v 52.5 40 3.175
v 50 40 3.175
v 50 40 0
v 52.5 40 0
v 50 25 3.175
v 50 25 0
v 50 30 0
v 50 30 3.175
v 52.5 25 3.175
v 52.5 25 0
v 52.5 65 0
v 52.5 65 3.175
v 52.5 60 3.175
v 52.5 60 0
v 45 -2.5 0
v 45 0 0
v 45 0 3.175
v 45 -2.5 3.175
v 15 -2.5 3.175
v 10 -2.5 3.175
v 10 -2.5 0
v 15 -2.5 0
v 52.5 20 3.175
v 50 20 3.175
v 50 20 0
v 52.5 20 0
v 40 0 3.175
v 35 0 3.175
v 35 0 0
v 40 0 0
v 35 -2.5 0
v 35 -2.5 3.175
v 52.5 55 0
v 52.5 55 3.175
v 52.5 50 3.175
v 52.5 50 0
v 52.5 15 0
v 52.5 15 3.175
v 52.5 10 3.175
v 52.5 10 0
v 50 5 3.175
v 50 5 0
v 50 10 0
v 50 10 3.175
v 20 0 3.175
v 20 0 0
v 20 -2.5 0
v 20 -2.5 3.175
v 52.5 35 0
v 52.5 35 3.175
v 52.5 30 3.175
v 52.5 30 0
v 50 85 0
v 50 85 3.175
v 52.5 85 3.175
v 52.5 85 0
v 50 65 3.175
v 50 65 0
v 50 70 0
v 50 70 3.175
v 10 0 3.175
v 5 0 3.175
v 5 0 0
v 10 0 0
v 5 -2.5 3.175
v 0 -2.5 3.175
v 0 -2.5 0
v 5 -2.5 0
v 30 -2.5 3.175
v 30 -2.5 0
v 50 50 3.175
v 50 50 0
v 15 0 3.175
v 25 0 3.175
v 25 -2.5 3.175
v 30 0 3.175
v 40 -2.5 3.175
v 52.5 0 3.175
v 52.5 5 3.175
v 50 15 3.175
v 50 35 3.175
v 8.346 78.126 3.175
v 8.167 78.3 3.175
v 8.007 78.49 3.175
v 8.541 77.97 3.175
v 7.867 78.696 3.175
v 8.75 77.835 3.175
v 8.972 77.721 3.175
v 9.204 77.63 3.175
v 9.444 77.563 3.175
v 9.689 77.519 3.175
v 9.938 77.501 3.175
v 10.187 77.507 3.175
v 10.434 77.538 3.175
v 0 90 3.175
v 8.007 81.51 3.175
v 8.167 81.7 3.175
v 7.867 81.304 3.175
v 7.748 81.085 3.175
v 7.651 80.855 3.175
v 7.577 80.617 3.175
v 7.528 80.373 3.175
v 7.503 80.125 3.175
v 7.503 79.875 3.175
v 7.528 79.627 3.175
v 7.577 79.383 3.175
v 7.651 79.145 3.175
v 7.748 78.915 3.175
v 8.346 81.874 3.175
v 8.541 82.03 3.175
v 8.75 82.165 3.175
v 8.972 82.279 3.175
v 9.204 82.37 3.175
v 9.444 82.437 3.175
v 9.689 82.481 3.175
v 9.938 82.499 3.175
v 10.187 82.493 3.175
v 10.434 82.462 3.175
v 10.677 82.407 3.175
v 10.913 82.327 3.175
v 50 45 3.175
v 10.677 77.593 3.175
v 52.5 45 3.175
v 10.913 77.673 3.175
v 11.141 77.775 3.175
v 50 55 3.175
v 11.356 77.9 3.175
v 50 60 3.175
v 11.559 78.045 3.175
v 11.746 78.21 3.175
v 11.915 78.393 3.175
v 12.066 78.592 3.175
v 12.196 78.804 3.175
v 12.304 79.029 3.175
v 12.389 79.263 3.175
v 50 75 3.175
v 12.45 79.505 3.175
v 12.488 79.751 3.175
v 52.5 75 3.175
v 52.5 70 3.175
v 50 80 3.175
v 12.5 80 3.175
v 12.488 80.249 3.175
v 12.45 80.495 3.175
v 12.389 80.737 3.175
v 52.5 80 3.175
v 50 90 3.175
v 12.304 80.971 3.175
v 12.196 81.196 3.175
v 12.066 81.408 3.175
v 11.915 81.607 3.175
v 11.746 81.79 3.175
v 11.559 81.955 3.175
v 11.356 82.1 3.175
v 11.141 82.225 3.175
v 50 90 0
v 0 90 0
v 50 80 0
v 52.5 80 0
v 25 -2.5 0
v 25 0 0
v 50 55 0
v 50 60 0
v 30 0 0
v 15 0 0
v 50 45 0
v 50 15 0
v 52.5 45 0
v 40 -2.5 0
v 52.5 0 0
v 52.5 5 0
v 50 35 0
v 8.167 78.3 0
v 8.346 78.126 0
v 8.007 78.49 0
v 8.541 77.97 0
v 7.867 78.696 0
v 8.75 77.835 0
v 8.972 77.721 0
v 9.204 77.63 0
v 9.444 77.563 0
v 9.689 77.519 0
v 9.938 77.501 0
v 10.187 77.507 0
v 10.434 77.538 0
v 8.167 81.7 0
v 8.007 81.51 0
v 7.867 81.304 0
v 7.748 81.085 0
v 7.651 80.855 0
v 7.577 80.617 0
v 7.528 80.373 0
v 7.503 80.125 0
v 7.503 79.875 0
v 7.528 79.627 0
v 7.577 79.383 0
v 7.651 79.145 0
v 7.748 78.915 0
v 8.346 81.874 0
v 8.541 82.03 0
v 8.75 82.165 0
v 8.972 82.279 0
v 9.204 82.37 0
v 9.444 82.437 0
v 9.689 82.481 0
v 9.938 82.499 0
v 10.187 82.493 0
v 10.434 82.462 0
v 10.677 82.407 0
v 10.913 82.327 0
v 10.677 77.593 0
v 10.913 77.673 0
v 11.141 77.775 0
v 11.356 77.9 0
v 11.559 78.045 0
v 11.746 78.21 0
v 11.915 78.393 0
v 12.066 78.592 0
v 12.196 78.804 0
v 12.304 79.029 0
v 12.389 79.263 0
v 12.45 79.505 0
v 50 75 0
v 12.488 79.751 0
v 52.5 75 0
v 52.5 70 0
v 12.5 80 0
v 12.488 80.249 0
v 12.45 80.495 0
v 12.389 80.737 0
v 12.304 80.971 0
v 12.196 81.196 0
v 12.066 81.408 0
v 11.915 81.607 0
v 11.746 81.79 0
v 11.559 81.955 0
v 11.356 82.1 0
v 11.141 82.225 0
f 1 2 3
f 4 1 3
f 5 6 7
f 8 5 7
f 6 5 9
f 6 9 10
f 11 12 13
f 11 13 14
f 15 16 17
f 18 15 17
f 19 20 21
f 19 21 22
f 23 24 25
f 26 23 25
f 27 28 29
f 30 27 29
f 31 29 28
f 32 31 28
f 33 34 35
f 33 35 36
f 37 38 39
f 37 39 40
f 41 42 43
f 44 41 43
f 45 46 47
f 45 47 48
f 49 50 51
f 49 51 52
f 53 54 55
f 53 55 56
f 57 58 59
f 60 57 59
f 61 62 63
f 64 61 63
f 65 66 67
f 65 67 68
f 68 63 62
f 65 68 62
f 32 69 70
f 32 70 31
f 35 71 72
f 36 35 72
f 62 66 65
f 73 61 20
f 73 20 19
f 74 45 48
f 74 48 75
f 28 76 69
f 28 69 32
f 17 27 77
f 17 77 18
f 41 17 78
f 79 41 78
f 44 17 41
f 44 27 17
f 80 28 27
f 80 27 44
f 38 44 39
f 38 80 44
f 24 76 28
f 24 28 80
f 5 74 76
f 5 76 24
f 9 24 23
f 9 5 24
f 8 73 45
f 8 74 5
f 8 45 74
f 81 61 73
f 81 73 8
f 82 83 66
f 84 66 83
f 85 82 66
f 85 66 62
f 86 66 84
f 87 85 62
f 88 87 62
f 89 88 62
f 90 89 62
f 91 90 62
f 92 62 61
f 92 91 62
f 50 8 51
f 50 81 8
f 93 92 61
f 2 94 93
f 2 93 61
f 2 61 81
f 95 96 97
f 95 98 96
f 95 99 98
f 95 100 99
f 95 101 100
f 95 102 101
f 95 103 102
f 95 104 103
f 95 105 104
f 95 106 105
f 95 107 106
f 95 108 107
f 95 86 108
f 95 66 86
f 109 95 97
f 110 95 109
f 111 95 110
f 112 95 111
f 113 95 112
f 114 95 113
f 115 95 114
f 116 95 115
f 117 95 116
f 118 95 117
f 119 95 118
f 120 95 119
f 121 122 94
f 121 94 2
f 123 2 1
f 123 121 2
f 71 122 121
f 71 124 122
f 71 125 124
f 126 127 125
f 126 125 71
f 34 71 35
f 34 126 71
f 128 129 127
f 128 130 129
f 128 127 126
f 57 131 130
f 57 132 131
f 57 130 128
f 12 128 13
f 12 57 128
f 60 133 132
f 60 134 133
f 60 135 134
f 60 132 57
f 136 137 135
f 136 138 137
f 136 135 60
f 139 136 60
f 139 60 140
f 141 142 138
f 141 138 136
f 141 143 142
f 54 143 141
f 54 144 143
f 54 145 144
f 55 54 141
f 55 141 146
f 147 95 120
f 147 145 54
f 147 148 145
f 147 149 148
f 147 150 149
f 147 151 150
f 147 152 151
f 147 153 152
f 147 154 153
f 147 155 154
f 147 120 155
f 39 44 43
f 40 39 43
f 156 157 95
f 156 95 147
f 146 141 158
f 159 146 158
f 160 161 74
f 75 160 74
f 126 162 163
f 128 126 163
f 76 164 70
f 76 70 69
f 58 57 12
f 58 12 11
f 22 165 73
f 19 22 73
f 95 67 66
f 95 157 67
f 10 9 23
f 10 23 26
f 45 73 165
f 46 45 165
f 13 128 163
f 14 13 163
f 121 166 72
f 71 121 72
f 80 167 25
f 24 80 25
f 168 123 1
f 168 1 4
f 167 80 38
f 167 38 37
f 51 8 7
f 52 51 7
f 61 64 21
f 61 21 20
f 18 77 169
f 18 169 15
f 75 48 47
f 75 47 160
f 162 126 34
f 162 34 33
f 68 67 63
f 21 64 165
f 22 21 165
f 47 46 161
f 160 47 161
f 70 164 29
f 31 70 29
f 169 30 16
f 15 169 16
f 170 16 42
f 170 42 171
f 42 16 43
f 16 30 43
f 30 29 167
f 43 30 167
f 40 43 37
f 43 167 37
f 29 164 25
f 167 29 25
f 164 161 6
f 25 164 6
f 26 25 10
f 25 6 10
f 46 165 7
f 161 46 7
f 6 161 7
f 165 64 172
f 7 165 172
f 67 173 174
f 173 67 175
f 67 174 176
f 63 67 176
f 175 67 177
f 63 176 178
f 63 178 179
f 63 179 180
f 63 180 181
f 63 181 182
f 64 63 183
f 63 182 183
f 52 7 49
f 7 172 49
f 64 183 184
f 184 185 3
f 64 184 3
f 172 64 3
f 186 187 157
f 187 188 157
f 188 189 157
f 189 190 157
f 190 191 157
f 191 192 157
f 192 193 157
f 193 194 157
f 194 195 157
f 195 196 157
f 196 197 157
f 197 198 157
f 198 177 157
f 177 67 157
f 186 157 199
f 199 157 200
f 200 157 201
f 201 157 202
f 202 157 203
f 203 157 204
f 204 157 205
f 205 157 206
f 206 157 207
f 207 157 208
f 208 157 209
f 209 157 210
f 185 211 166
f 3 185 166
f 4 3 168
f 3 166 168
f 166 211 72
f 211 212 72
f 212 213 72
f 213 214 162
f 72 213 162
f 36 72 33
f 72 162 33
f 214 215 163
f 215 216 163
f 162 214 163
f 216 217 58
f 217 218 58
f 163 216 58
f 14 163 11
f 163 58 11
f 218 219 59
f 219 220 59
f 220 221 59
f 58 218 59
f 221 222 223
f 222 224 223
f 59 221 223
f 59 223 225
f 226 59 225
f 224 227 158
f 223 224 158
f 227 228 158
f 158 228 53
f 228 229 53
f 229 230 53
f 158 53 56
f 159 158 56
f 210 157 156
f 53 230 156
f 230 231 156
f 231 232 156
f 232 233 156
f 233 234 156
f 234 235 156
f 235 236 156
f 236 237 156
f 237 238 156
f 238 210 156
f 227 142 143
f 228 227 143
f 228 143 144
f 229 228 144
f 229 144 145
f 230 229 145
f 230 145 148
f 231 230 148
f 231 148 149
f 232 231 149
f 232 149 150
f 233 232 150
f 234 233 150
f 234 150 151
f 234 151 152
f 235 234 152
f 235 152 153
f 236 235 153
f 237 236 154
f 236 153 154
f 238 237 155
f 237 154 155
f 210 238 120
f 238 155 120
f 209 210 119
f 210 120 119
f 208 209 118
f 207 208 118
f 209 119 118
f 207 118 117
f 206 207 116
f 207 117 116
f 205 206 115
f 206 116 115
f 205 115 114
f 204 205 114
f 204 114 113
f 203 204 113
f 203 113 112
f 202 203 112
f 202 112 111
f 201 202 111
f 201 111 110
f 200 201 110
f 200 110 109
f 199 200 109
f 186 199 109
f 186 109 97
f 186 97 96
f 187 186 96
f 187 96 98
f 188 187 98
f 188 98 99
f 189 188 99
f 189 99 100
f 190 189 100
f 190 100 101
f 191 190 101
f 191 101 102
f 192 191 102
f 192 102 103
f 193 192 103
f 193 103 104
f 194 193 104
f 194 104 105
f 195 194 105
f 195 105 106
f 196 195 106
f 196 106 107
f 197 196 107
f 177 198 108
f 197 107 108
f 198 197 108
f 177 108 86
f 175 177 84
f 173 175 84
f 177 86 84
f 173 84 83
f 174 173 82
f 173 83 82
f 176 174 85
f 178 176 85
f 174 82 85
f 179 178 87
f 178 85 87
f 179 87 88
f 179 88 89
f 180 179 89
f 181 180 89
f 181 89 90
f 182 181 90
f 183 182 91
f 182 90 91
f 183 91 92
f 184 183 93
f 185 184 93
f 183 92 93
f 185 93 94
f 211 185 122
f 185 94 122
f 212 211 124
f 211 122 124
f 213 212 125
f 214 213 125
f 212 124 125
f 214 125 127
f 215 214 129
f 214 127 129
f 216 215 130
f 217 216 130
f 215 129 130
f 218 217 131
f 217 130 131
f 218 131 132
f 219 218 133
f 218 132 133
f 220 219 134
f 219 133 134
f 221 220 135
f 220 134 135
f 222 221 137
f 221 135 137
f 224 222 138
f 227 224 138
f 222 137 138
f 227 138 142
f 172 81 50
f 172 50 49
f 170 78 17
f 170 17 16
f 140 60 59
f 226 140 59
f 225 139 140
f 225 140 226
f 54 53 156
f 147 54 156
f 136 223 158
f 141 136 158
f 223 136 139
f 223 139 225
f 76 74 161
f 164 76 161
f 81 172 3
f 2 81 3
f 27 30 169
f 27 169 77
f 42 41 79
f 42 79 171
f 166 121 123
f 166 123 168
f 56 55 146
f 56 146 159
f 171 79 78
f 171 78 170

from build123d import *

# Parameters (mm, degrees)
SKETCH1_W           = 50
SKETCH1_H           = 90
BOSS_EXTRUDE2_DEPTH = 3.175
SKETCH2_W           = 3.175
SKETCH2_H           = 5
BOSS_EXTRUDE3_DEPTH = 2.5
LPATTERN1_COUNT     = 9
LPATTERN1_PITCH     = 10
SKETCH3_W           = 5
SKETCH3_H           = 3.175
BOSS_EXTRUDE4_DEPTH = 2.5
LPATTERN2_COUNT     = 5
LPATTERN2_PITCH     = 10
SKETCH4_R           = 2.5
CUT_EXTRUDE1_DEPTH  = 10


with BuildPart() as part:
    # Sketch1 → Boss-Extrude2 (new body)
    with BuildSketch(Plane.XY):
        with Locations((25, 45)):
            Rectangle(SKETCH1_W, SKETCH1_H)
    extrude(amount=BOSS_EXTRUDE2_DEPTH)

    # Sketch2 → Boss-Extrude3 (add)
    with BuildSketch(Plane(origin=(50, 0, 0), x_dir=(0, 0, -1), z_dir=(1, 0, 0))):
        with Locations((-1.5875, 2.5)):
            Rectangle(SKETCH2_W, SKETCH2_H)
    boss_extrude3 = extrude(amount=BOSS_EXTRUDE3_DEPTH)

    # LPattern1: Boss-Extrude3 ×9
    with Locations(*[(0, i * LPATTERN1_PITCH, 0) for i in range(1, LPATTERN1_COUNT)]):
        add(boss_extrude3)

    # Sketch3 → Boss-Extrude4 (add)
    with BuildSketch(Plane.XZ):
        with Locations((2.5, 1.5875)):
            Rectangle(SKETCH3_W, SKETCH3_H)
    boss_extrude4 = extrude(amount=BOSS_EXTRUDE4_DEPTH)

    # LPattern2: Boss-Extrude4 ×5
    with Locations(*[(i * LPATTERN2_PITCH, 0, 0) for i in range(1, LPATTERN2_COUNT)]):
        add(boss_extrude4)

    # Sketch4 → Cut-Extrude1 (cut)
    with BuildSketch(Plane.XY.offset(3.175)):
        with Locations((10, 80)):
            Circle(SKETCH4_R)
    extrude(amount=-CUT_EXTRUDE1_DEPTH, mode=Mode.SUBTRACT)


solid = part.part
